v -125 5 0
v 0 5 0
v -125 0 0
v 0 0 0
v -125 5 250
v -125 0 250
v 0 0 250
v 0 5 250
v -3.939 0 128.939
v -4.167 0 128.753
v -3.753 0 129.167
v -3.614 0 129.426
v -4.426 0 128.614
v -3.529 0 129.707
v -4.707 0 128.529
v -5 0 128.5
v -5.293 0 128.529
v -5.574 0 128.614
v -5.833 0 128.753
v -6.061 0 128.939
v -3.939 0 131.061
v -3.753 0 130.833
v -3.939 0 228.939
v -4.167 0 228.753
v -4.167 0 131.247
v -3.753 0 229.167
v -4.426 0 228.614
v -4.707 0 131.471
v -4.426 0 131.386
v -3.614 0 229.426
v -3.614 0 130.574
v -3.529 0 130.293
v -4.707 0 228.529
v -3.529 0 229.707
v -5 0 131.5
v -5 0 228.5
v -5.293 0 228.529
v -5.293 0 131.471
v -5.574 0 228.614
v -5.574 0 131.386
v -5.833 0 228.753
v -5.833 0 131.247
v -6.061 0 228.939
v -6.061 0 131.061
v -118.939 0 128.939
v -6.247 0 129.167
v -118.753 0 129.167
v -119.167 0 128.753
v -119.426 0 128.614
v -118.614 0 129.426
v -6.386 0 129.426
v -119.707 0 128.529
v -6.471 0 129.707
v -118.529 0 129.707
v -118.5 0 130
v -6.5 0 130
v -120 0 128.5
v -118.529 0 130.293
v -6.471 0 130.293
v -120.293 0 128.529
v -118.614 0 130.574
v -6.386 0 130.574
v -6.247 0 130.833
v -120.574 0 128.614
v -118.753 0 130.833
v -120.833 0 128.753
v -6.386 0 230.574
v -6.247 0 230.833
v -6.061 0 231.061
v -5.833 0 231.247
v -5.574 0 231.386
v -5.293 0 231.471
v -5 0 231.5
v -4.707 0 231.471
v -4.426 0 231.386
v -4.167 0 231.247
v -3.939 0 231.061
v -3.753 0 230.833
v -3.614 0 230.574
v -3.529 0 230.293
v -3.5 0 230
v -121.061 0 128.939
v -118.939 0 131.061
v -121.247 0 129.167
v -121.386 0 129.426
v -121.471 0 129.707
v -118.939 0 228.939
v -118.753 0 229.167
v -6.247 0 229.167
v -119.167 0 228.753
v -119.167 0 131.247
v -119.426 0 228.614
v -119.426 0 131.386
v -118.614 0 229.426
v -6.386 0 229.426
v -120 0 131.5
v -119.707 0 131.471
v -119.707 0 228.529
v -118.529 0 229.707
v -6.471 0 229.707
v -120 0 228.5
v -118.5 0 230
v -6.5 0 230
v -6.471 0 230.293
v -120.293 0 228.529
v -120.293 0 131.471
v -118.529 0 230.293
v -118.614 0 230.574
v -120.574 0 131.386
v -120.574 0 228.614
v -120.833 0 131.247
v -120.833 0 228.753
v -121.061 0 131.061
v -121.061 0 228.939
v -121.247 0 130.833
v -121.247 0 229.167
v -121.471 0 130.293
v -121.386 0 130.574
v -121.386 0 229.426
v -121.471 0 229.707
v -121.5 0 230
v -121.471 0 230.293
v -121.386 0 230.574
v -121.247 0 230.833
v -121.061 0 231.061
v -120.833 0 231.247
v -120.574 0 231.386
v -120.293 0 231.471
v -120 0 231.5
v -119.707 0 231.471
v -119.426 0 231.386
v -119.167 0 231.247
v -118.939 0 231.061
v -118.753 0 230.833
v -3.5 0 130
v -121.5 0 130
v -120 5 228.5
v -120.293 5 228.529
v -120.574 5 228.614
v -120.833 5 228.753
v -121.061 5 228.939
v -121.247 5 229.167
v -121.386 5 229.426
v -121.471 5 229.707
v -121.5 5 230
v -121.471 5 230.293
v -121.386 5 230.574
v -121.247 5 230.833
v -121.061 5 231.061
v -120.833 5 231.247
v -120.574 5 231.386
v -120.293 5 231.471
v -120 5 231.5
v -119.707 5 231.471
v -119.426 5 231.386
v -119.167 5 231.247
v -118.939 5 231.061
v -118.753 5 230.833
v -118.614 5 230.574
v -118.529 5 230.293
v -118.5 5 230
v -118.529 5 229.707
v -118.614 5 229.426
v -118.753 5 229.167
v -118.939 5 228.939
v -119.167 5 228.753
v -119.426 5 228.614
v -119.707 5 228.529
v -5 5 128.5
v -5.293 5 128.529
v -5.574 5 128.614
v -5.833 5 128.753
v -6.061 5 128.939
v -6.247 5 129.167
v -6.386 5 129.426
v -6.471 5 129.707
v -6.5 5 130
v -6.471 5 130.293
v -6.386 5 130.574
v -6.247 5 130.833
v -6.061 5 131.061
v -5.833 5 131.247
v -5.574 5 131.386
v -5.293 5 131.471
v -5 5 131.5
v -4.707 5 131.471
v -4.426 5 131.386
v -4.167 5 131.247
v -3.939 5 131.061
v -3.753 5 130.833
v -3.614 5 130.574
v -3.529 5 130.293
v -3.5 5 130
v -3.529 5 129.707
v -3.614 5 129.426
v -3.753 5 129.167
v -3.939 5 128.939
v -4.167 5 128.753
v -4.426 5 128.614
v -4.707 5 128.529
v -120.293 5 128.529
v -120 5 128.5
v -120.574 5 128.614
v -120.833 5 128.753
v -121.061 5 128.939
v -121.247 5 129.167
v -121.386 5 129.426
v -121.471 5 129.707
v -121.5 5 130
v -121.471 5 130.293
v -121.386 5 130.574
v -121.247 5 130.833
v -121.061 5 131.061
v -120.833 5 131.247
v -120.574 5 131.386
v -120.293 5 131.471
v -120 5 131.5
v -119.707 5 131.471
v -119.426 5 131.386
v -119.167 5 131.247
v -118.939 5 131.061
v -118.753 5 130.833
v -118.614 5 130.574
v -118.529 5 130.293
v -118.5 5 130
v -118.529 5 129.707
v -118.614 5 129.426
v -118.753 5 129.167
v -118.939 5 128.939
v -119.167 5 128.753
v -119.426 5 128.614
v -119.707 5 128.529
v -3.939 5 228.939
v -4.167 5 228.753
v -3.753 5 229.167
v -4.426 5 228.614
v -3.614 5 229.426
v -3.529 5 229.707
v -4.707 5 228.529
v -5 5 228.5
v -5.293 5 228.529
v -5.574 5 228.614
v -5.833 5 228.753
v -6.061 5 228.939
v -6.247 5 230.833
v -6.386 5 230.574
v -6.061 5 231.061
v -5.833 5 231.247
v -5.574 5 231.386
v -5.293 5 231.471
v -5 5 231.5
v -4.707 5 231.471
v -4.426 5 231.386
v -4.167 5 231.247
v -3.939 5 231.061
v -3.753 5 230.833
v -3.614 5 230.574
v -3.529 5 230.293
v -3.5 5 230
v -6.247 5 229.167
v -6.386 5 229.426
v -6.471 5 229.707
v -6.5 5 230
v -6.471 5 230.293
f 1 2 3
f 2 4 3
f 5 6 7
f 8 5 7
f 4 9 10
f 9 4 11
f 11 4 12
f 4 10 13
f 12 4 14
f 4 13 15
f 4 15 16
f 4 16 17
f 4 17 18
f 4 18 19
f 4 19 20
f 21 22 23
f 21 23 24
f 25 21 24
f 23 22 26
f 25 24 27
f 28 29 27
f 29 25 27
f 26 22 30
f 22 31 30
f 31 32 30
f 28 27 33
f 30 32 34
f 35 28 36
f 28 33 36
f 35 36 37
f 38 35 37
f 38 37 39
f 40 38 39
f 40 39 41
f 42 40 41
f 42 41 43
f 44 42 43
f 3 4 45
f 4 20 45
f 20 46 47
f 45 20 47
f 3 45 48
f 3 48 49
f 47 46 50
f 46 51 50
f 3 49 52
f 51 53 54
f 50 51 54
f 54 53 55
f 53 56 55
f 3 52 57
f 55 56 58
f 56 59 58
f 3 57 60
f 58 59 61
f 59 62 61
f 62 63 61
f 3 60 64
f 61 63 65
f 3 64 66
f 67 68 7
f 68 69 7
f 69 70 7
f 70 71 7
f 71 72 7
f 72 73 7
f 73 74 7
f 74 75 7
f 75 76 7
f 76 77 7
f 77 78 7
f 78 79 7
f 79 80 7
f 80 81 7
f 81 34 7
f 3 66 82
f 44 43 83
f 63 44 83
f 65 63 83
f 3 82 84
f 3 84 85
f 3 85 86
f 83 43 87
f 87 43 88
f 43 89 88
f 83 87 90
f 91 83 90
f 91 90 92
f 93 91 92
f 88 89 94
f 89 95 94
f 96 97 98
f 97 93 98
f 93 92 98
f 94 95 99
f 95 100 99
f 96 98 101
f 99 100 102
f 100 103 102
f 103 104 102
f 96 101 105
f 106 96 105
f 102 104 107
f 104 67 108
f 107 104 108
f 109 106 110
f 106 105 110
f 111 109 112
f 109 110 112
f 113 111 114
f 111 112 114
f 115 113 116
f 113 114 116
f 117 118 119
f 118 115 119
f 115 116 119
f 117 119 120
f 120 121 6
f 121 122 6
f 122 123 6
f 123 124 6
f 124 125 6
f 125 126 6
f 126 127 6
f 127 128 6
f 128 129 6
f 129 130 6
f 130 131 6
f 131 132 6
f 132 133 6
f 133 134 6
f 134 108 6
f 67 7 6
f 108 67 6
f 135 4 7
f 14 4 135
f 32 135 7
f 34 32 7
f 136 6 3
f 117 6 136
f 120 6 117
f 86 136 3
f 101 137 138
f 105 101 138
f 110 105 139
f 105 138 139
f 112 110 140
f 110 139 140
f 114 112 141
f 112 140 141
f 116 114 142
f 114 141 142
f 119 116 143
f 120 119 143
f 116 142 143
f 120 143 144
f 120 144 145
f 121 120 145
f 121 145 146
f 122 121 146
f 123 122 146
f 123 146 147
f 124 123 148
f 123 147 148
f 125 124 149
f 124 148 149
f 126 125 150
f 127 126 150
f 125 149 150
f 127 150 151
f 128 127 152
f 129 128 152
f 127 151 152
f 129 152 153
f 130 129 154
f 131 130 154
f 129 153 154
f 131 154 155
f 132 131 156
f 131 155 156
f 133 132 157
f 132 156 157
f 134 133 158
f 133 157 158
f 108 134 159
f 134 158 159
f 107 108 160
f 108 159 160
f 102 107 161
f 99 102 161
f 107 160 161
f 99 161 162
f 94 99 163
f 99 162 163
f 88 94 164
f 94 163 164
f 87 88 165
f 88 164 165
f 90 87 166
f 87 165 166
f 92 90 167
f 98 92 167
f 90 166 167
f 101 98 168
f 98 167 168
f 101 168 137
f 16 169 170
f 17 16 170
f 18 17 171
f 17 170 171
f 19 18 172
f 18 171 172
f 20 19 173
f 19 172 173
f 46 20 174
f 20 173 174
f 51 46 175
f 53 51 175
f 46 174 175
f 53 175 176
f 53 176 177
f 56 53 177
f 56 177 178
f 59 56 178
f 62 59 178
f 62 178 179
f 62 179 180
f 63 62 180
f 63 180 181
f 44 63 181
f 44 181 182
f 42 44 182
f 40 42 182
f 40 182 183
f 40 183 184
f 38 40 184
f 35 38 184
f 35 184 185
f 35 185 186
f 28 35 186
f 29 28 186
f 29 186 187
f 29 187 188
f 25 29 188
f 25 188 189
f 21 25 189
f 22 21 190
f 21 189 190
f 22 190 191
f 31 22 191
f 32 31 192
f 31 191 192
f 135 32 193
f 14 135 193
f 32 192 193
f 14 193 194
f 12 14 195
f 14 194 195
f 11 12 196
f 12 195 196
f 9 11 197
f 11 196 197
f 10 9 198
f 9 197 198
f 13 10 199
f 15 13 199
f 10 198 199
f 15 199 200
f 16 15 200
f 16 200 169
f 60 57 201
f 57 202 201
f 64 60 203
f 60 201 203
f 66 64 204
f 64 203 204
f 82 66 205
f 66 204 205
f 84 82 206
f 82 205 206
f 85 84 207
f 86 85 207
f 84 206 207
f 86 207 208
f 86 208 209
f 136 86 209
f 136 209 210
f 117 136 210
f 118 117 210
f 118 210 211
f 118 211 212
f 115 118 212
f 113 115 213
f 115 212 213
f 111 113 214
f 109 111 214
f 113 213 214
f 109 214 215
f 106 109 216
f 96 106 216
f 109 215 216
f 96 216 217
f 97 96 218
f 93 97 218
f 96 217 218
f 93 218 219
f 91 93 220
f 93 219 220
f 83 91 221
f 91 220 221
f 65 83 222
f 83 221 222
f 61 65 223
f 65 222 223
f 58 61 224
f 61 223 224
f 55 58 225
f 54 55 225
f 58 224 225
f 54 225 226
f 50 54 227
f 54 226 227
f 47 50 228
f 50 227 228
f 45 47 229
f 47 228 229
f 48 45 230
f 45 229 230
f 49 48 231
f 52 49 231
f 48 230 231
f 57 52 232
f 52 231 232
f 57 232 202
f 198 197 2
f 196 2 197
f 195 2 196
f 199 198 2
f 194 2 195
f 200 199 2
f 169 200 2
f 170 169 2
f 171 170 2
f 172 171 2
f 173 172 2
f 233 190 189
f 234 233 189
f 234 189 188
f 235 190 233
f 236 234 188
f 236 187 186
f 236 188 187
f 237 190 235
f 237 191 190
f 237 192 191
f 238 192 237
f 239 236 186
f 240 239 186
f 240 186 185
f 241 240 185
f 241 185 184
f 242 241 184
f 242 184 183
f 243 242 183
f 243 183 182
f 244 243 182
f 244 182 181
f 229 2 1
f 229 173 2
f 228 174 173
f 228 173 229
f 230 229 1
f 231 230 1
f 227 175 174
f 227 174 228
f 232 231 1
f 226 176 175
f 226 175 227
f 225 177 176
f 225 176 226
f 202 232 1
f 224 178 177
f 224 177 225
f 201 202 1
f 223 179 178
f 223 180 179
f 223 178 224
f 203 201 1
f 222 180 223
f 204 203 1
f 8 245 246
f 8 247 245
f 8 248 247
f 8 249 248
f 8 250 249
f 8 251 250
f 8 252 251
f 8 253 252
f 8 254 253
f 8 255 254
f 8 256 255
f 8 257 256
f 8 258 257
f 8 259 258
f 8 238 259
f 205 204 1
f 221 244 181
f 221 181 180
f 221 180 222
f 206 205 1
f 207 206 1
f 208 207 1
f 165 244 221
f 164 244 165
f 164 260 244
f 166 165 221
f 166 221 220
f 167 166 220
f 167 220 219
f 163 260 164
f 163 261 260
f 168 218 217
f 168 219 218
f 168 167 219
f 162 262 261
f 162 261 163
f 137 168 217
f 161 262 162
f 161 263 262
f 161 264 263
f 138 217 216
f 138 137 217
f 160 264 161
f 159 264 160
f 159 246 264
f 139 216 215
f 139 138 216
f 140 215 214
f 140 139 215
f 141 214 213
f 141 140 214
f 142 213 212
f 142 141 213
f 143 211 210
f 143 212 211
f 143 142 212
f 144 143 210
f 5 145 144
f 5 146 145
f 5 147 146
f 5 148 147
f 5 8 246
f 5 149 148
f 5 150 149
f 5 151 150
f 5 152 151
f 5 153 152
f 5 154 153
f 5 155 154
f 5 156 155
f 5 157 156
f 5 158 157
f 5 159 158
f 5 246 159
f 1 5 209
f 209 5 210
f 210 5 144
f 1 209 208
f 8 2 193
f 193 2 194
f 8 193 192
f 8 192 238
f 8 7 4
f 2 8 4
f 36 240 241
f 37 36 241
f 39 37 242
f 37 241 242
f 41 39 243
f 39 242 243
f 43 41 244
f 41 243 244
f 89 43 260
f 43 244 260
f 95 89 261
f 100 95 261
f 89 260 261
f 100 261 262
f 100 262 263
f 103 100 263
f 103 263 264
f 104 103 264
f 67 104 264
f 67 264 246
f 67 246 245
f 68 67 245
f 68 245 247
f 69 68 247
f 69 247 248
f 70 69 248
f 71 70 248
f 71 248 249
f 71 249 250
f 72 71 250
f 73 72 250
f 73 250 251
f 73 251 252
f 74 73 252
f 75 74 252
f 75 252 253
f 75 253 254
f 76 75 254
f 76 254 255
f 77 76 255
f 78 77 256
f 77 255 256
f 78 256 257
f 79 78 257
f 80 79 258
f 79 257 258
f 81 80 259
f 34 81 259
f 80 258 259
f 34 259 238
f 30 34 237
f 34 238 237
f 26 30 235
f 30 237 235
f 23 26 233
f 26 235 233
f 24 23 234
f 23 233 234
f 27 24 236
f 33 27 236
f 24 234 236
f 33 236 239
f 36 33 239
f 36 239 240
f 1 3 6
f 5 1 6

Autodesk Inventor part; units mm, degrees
ref_plane "YZ Plane" through (0, 0, 0) normal (1, 0, 0) x (0, 1, 0)
ref_plane "XZ Plane" through (0, 0, 0) normal (0, 1, 0) x (-1, 0, 0)
ref_plane "XY Plane" through (0, 0, 0) normal (0, 0, 1) x (1, 0, 0)
sketch "Skizze1" plane through (0, 0, 0) normal (0, 1, 0) x (-1, 0, 0)
  line L0 (0, 0) -> (125, 0)
  line L1 (125, 0) -> (125, 250)
  line L2 (125, 250) -> (0, 250)
  line L3 (0, 250) -> (0, 0)
  dimension "d0" = 125
  dimension "d1" = 250
extrude "Extrusion1" add sketch "Skizze1" along normal blind 5
sketch "Skizze2" plane through (0, 0, 0) normal (0, -1, 0) x (1, 0, 0)
  line L0 (0, 250) -> (0, 0) projected
  line L1 (0, 0) -> (-125, 0) projected
  line L2 (0, 250) -> (0, 0) projected
  line L3 (-125, 250) -> (0, 250) projected
  line L4 (-125, 0) -> (-125, 250) projected
  line L5 (-125, 250) -> (0, 250) projected
  point P0 (-5, 230)
  point P1 (-5, 130)
  point P2 (-120, 230)
  point P3 (-120, 130)
  dimension "d4" = 5
  dimension "d5" = 20
  dimension "d8" = 100
  dimension "d11" = 115
hole "Bohrung1" at (-5, 0, 230) at (-5, 0, 130) at (-120, 0, 230) at (-120, 0, 130) direction (0, 1, 0) diameter 3 end through all
properties part number "grundplatte"
